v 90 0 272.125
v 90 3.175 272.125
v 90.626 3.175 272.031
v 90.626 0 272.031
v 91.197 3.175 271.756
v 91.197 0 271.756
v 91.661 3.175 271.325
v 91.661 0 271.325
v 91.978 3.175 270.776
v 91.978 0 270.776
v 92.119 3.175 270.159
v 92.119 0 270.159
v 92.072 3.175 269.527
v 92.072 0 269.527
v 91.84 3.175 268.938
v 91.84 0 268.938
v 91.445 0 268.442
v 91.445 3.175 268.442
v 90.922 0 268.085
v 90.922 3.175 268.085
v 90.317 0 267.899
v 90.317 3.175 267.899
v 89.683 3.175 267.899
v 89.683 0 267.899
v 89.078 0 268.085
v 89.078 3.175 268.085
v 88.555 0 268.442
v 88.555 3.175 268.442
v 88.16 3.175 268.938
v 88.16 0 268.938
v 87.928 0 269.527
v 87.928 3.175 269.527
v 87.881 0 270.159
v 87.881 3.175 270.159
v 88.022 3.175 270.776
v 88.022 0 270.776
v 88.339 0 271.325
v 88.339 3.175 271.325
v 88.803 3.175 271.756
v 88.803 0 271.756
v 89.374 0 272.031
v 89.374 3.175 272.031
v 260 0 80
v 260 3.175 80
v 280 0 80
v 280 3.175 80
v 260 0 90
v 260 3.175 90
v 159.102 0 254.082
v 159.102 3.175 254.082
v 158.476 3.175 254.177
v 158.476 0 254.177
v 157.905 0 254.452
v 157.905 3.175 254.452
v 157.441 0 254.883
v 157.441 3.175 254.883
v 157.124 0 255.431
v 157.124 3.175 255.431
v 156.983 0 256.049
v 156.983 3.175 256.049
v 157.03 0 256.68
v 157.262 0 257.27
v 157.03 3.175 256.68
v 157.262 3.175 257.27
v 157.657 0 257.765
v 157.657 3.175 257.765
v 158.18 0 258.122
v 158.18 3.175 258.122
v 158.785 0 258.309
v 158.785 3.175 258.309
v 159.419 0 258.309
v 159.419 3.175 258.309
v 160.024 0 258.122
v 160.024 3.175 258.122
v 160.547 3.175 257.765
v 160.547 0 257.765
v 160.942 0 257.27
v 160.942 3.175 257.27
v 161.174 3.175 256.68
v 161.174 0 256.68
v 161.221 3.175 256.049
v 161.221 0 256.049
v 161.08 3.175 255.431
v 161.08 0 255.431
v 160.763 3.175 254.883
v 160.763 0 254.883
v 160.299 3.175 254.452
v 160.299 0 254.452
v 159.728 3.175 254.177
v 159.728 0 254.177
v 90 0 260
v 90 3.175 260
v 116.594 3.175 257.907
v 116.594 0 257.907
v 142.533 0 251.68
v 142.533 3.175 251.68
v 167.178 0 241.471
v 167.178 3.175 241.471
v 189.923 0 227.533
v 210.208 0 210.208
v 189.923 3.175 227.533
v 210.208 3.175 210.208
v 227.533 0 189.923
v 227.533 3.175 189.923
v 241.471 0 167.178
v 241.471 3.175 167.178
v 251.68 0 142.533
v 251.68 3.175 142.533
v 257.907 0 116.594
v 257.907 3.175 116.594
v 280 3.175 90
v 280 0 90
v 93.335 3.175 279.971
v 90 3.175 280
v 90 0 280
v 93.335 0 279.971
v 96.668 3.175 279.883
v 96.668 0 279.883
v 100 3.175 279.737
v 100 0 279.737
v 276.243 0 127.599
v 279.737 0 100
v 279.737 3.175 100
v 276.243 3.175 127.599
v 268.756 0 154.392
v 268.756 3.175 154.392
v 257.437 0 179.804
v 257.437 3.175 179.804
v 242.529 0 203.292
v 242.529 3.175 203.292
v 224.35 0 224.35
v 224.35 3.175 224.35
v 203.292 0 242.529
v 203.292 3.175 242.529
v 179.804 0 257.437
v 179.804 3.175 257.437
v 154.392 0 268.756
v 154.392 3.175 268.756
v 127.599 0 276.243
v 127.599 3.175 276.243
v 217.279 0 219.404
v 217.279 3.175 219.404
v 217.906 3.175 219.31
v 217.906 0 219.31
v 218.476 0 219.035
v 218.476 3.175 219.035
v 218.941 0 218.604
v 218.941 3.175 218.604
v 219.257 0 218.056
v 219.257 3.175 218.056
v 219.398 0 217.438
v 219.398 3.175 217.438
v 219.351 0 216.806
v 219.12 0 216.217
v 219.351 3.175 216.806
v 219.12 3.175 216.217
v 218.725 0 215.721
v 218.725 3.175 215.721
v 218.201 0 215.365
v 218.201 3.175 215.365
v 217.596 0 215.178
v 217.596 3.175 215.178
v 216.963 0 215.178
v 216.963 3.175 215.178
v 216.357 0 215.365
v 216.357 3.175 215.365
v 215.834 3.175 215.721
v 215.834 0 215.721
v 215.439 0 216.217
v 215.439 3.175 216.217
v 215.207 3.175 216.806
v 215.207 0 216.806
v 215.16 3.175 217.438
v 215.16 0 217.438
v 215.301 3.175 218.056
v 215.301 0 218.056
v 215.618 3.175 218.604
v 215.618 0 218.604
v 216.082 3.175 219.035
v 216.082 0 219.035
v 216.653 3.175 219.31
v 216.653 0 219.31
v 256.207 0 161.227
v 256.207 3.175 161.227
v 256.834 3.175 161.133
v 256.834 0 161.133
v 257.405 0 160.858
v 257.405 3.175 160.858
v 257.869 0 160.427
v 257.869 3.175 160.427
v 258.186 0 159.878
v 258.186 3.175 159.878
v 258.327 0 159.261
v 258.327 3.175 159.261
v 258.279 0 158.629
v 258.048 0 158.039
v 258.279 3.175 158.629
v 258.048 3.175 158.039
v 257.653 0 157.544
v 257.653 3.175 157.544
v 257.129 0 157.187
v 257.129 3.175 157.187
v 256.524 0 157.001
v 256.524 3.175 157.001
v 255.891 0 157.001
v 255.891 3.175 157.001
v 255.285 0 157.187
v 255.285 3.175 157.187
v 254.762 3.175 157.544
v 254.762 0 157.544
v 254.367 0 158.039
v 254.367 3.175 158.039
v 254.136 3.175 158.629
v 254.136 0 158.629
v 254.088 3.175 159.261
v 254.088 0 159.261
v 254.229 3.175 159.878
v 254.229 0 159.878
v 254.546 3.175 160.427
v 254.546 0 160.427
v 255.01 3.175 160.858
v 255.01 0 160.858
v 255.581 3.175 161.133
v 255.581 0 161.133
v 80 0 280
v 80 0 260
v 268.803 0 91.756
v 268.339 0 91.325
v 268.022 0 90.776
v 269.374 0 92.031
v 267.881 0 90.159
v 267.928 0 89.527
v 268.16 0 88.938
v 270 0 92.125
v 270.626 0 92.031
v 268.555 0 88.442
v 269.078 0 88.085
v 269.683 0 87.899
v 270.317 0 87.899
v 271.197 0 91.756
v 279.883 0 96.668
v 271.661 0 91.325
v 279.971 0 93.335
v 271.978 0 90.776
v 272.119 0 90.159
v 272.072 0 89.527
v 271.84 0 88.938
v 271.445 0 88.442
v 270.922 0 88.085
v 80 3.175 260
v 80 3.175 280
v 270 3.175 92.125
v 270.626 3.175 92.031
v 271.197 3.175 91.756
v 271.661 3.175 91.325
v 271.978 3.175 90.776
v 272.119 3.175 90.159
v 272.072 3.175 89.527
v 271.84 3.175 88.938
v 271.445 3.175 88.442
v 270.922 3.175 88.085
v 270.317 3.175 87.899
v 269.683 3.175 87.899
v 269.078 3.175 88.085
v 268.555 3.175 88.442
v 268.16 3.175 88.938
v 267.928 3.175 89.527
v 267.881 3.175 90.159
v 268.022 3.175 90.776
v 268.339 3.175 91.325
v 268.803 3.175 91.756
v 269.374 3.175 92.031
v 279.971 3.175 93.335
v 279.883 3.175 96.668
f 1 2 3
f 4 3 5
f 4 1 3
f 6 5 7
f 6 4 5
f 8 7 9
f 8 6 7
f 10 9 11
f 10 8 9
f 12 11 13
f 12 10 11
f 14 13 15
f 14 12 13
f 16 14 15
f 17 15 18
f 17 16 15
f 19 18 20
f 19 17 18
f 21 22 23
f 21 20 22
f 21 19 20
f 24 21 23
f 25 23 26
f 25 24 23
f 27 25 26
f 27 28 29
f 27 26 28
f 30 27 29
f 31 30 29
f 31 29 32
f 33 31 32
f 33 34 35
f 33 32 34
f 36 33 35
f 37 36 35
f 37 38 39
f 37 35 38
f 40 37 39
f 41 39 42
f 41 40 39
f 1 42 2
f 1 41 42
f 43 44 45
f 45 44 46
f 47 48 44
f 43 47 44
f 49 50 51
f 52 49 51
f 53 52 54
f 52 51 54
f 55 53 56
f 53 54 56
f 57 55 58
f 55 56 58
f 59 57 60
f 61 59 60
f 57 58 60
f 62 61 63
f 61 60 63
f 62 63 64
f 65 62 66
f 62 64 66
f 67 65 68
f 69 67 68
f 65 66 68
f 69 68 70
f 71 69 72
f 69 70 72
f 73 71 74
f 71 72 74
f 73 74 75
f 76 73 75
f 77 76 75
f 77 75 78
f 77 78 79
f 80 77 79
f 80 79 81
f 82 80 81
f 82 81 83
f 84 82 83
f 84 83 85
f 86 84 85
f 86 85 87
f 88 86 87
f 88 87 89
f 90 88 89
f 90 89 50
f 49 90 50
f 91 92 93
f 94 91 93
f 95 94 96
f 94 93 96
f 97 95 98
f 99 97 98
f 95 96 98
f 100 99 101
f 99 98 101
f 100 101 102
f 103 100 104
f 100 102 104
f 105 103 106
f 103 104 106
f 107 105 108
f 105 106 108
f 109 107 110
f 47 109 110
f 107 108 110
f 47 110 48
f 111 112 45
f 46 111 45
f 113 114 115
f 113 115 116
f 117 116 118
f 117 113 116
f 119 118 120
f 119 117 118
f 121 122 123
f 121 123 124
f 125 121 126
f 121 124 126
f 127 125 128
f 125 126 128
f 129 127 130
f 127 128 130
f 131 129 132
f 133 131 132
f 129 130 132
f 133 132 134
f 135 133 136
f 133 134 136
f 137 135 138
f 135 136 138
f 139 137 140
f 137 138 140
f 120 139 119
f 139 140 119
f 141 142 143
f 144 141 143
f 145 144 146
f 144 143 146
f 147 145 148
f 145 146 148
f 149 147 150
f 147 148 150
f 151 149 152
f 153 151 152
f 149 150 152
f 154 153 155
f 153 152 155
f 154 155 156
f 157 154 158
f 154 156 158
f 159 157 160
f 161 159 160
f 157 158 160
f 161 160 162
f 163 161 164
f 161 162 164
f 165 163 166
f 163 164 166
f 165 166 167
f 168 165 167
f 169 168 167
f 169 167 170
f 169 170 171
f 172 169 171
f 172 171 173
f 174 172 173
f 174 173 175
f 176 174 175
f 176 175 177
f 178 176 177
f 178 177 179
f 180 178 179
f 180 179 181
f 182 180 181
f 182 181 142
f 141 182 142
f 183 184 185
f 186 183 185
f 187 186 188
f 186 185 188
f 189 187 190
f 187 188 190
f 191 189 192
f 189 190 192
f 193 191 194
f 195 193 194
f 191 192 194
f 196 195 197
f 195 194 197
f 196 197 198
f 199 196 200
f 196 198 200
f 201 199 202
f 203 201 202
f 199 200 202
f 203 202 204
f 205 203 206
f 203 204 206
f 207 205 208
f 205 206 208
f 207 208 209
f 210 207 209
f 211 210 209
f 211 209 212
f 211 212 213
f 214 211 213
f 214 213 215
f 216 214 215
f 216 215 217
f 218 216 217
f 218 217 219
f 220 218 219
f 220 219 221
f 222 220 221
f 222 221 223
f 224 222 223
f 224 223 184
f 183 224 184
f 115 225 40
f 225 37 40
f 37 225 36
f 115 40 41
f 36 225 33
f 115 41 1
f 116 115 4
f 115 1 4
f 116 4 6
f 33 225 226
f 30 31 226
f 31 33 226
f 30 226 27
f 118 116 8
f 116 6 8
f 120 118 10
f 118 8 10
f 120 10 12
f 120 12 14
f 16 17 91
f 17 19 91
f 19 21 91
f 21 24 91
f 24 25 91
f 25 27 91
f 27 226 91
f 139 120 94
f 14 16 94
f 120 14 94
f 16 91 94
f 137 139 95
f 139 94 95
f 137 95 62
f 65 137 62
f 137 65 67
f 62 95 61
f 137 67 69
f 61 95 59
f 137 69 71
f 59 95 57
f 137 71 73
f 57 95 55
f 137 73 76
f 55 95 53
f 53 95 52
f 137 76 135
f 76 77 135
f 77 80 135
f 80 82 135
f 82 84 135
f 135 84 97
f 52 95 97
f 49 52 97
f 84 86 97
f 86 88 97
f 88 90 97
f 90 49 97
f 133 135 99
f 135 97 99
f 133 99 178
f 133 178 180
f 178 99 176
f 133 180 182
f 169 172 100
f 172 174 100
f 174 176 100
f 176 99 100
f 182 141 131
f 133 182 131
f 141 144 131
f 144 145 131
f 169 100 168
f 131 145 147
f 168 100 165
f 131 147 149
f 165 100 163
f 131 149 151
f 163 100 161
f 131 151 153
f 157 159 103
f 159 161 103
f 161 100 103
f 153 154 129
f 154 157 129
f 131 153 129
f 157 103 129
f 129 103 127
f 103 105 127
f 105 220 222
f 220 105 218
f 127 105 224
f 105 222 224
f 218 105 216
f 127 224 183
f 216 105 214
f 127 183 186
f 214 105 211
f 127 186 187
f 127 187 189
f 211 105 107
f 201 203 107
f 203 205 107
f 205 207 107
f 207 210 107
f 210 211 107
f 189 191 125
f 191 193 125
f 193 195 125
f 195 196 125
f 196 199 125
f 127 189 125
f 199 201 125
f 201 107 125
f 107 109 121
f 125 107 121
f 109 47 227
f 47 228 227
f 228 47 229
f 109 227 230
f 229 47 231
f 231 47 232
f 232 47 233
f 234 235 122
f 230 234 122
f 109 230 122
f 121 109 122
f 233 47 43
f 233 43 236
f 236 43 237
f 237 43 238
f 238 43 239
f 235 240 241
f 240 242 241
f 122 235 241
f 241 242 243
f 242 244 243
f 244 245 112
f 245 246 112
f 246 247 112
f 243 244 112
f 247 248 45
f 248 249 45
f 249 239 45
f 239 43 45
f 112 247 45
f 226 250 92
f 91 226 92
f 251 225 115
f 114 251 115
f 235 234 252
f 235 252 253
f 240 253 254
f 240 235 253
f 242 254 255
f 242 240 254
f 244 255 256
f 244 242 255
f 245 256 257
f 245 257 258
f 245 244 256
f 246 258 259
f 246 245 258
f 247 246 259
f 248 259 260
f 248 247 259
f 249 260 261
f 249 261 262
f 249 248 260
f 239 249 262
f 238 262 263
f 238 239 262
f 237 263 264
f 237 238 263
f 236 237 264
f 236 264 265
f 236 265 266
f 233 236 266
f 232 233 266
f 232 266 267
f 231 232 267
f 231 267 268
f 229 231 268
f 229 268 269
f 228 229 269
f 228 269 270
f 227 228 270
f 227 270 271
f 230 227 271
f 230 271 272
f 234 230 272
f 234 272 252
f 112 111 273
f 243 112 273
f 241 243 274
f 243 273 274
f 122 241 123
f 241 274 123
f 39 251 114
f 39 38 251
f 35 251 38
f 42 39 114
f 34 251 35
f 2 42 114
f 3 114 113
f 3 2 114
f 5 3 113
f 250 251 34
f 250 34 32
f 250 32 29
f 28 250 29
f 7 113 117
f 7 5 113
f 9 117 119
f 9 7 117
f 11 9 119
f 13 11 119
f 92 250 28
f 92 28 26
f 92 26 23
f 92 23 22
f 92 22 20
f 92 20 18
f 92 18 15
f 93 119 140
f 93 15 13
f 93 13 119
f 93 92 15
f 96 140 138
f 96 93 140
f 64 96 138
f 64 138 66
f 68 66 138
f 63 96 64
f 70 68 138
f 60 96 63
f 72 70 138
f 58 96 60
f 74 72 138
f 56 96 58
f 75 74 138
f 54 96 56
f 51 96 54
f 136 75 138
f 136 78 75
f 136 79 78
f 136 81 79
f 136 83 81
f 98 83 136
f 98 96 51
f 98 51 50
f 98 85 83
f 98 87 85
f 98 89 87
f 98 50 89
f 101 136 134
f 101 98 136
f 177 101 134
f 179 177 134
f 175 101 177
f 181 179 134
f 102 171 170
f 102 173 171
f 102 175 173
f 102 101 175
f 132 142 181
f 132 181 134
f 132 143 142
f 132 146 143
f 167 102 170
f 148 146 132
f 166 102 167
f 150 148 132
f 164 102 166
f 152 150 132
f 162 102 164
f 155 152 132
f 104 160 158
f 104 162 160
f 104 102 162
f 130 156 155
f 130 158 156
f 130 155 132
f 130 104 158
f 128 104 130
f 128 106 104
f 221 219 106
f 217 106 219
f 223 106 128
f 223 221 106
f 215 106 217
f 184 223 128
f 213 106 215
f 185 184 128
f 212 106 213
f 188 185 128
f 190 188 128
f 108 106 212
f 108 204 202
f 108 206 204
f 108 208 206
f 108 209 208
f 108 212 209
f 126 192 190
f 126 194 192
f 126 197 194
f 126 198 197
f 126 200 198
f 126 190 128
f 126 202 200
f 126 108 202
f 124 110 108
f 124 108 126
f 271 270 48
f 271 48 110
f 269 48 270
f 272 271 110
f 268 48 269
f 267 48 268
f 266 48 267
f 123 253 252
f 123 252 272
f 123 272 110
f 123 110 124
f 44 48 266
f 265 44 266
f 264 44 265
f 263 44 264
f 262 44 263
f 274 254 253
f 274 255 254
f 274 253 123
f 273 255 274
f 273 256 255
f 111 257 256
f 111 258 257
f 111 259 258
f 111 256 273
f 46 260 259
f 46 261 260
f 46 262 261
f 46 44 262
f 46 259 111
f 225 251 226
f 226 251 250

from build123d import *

# Parameters (mm, degrees)
SKETCH1_R           = 2.125
BOSS_EXTRUDE1_DEPTH = 3.175
CUT_EXTRUDE1_DEPTH  = 396.992525971
BOSS_EXTRUDE2_DEPTH = 3.175
SKETCH4_R           = 2.125
CUT_EXTRUDE2_DEPTH  = 396.992525971


with BuildPart() as part:
    # Sketch1 → Boss-Extrude1 (new body)
    with BuildSketch(Plane(origin=(0, 0, 0), x_dir=(1, 0, 0), z_dir=(0, 1, 0))):
        Polygon((0, -280), (100, -280), (100, -209.601551084), (209.601551084, -100), (280, -100), (280, 0), (280, 100), (209.601551084, 100), (100, 209.601551084), (100, 280), (0, 280), (-100, 280), (-100, 209.601551084), (-209.601551084, 100), (-280, 100), (-280, 0), (-280, -100), (-209.601551084, -100), (-100, -209.601551084), (-100, -280), align=None)
        with Locations(Location((-47.5, -192, 0), (0, 0, 270))):
            Circle(SKETCH1_R, mode=Mode.SUBTRACT)
        with Locations(Location((-47.5, -217, 0), (0, 0, 270))):
            Circle(SKETCH1_R, mode=Mode.SUBTRACT)
        with Locations(Location((47.5, -217, 0), (0, 0, 270))):
            Circle(SKETCH1_R, mode=Mode.SUBTRACT)
        with Locations(Location((47.5, -192, 0), (0, 0, 270))):
            Circle(SKETCH1_R, mode=Mode.SUBTRACT)
        with Locations(Location((-192, 47.5, 0), (0, 0, 270))):
            Circle(SKETCH1_R, mode=Mode.SUBTRACT)
        with Locations(Location((-217, 47.5, 0), (0, 0, 270))):
            Circle(SKETCH1_R, mode=Mode.SUBTRACT)
        with Locations(Location((-192, -47.5, 0), (0, 0, 270))):
            Circle(SKETCH1_R, mode=Mode.SUBTRACT)
        with Locations(Location((-217, -47.5, 0), (0, 0, 270))):
            Circle(SKETCH1_R, mode=Mode.SUBTRACT)
        with Locations(Location((47.5, 192, 0), (0, 0, 270))):
            Circle(SKETCH1_R, mode=Mode.SUBTRACT)
        with Locations(Location((47.5, 217, 0), (0, 0, 270))):
            Circle(SKETCH1_R, mode=Mode.SUBTRACT)
        with Locations(Location((-47.5, 192, 0), (0, 0, 270))):
            Circle(SKETCH1_R, mode=Mode.SUBTRACT)
        with Locations(Location((-47.5, 217, 0), (0, 0, 270))):
            Circle(SKETCH1_R, mode=Mode.SUBTRACT)
        with Locations(Location((192, -47.5, 0), (0, 0, 270))):
            Circle(SKETCH1_R, mode=Mode.SUBTRACT)
        with Locations(Location((217, -47.5, 0), (0, 0, 270))):
            Circle(SKETCH1_R, mode=Mode.SUBTRACT)
        with Locations(Location((192, 47.5, 0), (0, 0, 270))):
            Circle(SKETCH1_R, mode=Mode.SUBTRACT)
        with Locations(Location((217, 47.5, 0), (0, 0, 270))):
            Circle(SKETCH1_R, mode=Mode.SUBTRACT)
        with Locations(Location((-90, -270, 0), (0, 0, 270))):
            Circle(SKETCH1_R, mode=Mode.SUBTRACT)
        with Locations(Location((-30, -270, 0), (0, 0, 270))):
            Circle(SKETCH1_R, mode=Mode.SUBTRACT)
        with Locations(Location((30, -270, 0), (0, 0, 270))):
            Circle(SKETCH1_R, mode=Mode.SUBTRACT)
        with Locations(Location((90, -270, 0), (0, 0, 270))):
            Circle(SKETCH1_R, mode=Mode.SUBTRACT)
        with Locations(Location((-270, 90, 0), (0, 0, 270))):
            Circle(SKETCH1_R, mode=Mode.SUBTRACT)
        with Locations(Location((-270, 30, 0), (0, 0, 270))):
            Circle(SKETCH1_R, mode=Mode.SUBTRACT)
        with Locations(Location((-270, -30, 0), (0, 0, 270))):
            Circle(SKETCH1_R, mode=Mode.SUBTRACT)
        with Locations(Location((-270, -90, 0), (0, 0, 270))):
            Circle(SKETCH1_R, mode=Mode.SUBTRACT)
        with Locations(Location((90, 270, 0), (0, 0, 270))):
            Circle(SKETCH1_R, mode=Mode.SUBTRACT)
        with Locations(Location((30, 270, 0), (0, 0, 270))):
            Circle(SKETCH1_R, mode=Mode.SUBTRACT)
        with Locations(Location((-30, 270, 0), (0, 0, 270))):
            Circle(SKETCH1_R, mode=Mode.SUBTRACT)
        with Locations(Location((-90, 270, 0), (0, 0, 270))):
            Circle(SKETCH1_R, mode=Mode.SUBTRACT)
        with Locations(Location((270, -90, 0), (0, 0, 270))):
            Circle(SKETCH1_R, mode=Mode.SUBTRACT)
        with Locations(Location((270, -30, 0), (0, 0, 270))):
            Circle(SKETCH1_R, mode=Mode.SUBTRACT)
        with Locations(Location((270, 30, 0), (0, 0, 270))):
            Circle(SKETCH1_R, mode=Mode.SUBTRACT)
        with Locations(Location((270, 90, 0), (0, 0, 270))):
            Circle(SKETCH1_R, mode=Mode.SUBTRACT)
        with Locations(Location((-90, -250, 0), (0, 0, 270))):
            Circle(SKETCH1_R, mode=Mode.SUBTRACT)
        with Locations(Location((-90, -180, 0), (0, 0, 270))):
            Circle(SKETCH1_R, mode=Mode.SUBTRACT)
        with Locations(Location((-90, -110, 0), (0, 0, 270))):
            Circle(SKETCH1_R, mode=Mode.SUBTRACT)
        with Locations(Location((-90, -40, 0), (0, 0, 270))):
            Circle(SKETCH1_R, mode=Mode.SUBTRACT)
        with Locations(Location((-90, 30, 0), (0, 0, 270))):
            Circle(SKETCH1_R, mode=Mode.SUBTRACT)
        with Locations(Location((-90, 50, 0), (0, 0, 270))):
            Circle(SKETCH1_R, mode=Mode.SUBTRACT)
        with Locations(Location((-90, 150, 0), (0, 0, 270))):
            Circle(SKETCH1_R, mode=Mode.SUBTRACT)
        with Locations(Location((-90, 250, 0), (0, 0, 270))):
            Circle(SKETCH1_R, mode=Mode.SUBTRACT)
        with Locations(Location((90, -250, 0), (0, 0, 270))):
            Circle(SKETCH1_R, mode=Mode.SUBTRACT)
        with Locations(Location((90, -180, 0), (0, 0, 270))):
            Circle(SKETCH1_R, mode=Mode.SUBTRACT)
        with Locations(Location((90, -110, 0), (0, 0, 270))):
            Circle(SKETCH1_R, mode=Mode.SUBTRACT)
        with Locations(Location((90, -40, 0), (0, 0, 270))):
            Circle(SKETCH1_R, mode=Mode.SUBTRACT)
        with Locations(Location((90, 30, 0), (0, 0, 270))):
            Circle(SKETCH1_R, mode=Mode.SUBTRACT)
        with Locations(Location((90, 50, 0), (0, 0, 270))):
            Circle(SKETCH1_R, mode=Mode.SUBTRACT)
        with Locations(Location((90, 150, 0), (0, 0, 270))):
            Circle(SKETCH1_R, mode=Mode.SUBTRACT)
        with Locations(Location((90, 250, 0), (0, 0, 270))):
            Circle(SKETCH1_R, mode=Mode.SUBTRACT)
        with Locations(Location((-250, -90, 0), (0, 0, 270))):
            Circle(SKETCH1_R, mode=Mode.SUBTRACT)
        with Locations(Location((-180, -90, 0), (0, 0, 270))):
            Circle(SKETCH1_R, mode=Mode.SUBTRACT)
        with Locations(Location((-110, -90, 0), (0, 0, 270))):
            Circle(SKETCH1_R, mode=Mode.SUBTRACT)
        with Locations(Location((-110, 90, 0), (0, 0, 270))):
            Circle(SKETCH1_R, mode=Mode.SUBTRACT)
        with Locations(Location((-180, 90, 0), (0, 0, 270))):
            Circle(SKETCH1_R, mode=Mode.SUBTRACT)
        with Locations(Location((-250, 90, 0), (0, 0, 270))):
            Circle(SKETCH1_R, mode=Mode.SUBTRACT)
        with Locations(Location((110, -90, 0), (0, 0, 270))):
            Circle(SKETCH1_R, mode=Mode.SUBTRACT)
        with Locations(Location((180, -90, 0), (0, 0, 270))):
            Circle(SKETCH1_R, mode=Mode.SUBTRACT)
        with Locations(Location((250, -90, 0), (0, 0, 270))):
            Circle(SKETCH1_R, mode=Mode.SUBTRACT)
        with Locations(Location((110, 90, 0), (0, 0, 270))):
            Circle(SKETCH1_R, mode=Mode.SUBTRACT)
        with Locations(Location((180, 90, 0), (0, 0, 270))):
            Circle(SKETCH1_R, mode=Mode.SUBTRACT)
        with Locations(Location((250, 90, 0), (0, 0, 270))):
            Circle(SKETCH1_R, mode=Mode.SUBTRACT)
    extrude(amount=BOSS_EXTRUDE1_DEPTH)

    # Sketch2 → Cut-Extrude1 (cut, through all)
    with BuildSketch(Plane(origin=(0, 3.175, 0), x_dir=(1, 0, 0), z_dir=(0, 1, 0))):
        Polygon((80, -260), (100, -260), (100, -209.601551084), (209.601551084, -100), (260, -100), (260, -80), (280, -80), (280, 100), (209.601551084, 100), (100, 209.601551084), (100, 280), (-100, 280), (-100, 209.601551084), (-209.601551084, 100), (-280, 100), (-280, -100), (-209.601551084, -100), (-100, -209.601551084), (-100, -280), (80, -280), align=None)
    extrude(amount=-CUT_EXTRUDE1_DEPTH, mode=Mode.SUBTRACT)


with BuildPart() as cut_extrude1_piece_1:
    # of the separate pieces the step leaves, piece 1, a body of its own (cut_extrude1_pieces)
    add(part.part.solids().sort_by_distance((100, 0, 280))[0])



with BuildPart() as cut_extrude1_piece_2:
    # of the separate pieces the step leaves, piece 2, a body of its own (cut_extrude1_pieces)
    add(part.part.solids().sort_by_distance((260, 3.175, 100))[0])


with BuildPart() as cut_extrude1_piece_1_1:
    add(cut_extrude1_piece_1.part)

    add(cut_extrude1_piece_2.part)  # Boss-Extrude2 merges Cut-Extrude1 piece 2
    # Sketch3 → Boss-Extrude2 (add)
    with BuildSketch(Plane(origin=(0, 3.175, 0), x_dir=(1, 0, 0), z_dir=(0, 1, 0))):
        with BuildLine():
            Line((260, -90), (267.875, -90))
            ThreePointArc((267.875, -90), (270, -92.125), (272.125, -90))
            Line((272.125, -90), (280, -90))
            ThreePointArc((280, -90), (224.350288425, -224.350288425), (90, -280))
            Line((90, -280), (90, -272.125))
            ThreePointArc((90, -272.125), (92.125, -270), (90, -267.875))
            Line((90, -267.875), (90, -260))
            ThreePointArc((90, -260), (210.208152802, -210.208152802), (260, -90))
        make_face()
    extrude(amount=-BOSS_EXTRUDE2_DEPTH)

    # Sketch4 → Cut-Extrude2 (cut, through all)
    with BuildSketch(Plane(origin=(0, 3.175, 0), x_dir=(1, 0, 0), z_dir=(0, 1, 0))):
        with Locations(Location((217.279220614, -217.279220614, 0), (0, 0, 270))):
            Circle(SKETCH4_R)
        with Locations(Location((256.207454383, -159.101968912, 0), (0, 0, 270))):
            Circle(SKETCH4_R)
        with Locations(Location((159.101968912, -256.207454383, 0), (0, 0, 90))):
            Circle(SKETCH4_R)
        with BuildLine():
            Line((100, -280), (90, -280))
            ThreePointArc((90, -280), (95.001733404, -279.934153493), (100, -279.73665961))
            Line((100, -279.73665961), (100, -280))
        make_face()
        with BuildLine():
            Line((279.73665961, -100), (284.415704741, -100))
            Line((284.415704741, -100), (280, -90))
            ThreePointArc((280, -90), (279.934153493, -95.001733404), (279.73665961, -100))
        make_face()
    extrude(amount=-CUT_EXTRUDE2_DEPTH, mode=Mode.SUBTRACT)


solid = cut_extrude1_piece_1_1.part
